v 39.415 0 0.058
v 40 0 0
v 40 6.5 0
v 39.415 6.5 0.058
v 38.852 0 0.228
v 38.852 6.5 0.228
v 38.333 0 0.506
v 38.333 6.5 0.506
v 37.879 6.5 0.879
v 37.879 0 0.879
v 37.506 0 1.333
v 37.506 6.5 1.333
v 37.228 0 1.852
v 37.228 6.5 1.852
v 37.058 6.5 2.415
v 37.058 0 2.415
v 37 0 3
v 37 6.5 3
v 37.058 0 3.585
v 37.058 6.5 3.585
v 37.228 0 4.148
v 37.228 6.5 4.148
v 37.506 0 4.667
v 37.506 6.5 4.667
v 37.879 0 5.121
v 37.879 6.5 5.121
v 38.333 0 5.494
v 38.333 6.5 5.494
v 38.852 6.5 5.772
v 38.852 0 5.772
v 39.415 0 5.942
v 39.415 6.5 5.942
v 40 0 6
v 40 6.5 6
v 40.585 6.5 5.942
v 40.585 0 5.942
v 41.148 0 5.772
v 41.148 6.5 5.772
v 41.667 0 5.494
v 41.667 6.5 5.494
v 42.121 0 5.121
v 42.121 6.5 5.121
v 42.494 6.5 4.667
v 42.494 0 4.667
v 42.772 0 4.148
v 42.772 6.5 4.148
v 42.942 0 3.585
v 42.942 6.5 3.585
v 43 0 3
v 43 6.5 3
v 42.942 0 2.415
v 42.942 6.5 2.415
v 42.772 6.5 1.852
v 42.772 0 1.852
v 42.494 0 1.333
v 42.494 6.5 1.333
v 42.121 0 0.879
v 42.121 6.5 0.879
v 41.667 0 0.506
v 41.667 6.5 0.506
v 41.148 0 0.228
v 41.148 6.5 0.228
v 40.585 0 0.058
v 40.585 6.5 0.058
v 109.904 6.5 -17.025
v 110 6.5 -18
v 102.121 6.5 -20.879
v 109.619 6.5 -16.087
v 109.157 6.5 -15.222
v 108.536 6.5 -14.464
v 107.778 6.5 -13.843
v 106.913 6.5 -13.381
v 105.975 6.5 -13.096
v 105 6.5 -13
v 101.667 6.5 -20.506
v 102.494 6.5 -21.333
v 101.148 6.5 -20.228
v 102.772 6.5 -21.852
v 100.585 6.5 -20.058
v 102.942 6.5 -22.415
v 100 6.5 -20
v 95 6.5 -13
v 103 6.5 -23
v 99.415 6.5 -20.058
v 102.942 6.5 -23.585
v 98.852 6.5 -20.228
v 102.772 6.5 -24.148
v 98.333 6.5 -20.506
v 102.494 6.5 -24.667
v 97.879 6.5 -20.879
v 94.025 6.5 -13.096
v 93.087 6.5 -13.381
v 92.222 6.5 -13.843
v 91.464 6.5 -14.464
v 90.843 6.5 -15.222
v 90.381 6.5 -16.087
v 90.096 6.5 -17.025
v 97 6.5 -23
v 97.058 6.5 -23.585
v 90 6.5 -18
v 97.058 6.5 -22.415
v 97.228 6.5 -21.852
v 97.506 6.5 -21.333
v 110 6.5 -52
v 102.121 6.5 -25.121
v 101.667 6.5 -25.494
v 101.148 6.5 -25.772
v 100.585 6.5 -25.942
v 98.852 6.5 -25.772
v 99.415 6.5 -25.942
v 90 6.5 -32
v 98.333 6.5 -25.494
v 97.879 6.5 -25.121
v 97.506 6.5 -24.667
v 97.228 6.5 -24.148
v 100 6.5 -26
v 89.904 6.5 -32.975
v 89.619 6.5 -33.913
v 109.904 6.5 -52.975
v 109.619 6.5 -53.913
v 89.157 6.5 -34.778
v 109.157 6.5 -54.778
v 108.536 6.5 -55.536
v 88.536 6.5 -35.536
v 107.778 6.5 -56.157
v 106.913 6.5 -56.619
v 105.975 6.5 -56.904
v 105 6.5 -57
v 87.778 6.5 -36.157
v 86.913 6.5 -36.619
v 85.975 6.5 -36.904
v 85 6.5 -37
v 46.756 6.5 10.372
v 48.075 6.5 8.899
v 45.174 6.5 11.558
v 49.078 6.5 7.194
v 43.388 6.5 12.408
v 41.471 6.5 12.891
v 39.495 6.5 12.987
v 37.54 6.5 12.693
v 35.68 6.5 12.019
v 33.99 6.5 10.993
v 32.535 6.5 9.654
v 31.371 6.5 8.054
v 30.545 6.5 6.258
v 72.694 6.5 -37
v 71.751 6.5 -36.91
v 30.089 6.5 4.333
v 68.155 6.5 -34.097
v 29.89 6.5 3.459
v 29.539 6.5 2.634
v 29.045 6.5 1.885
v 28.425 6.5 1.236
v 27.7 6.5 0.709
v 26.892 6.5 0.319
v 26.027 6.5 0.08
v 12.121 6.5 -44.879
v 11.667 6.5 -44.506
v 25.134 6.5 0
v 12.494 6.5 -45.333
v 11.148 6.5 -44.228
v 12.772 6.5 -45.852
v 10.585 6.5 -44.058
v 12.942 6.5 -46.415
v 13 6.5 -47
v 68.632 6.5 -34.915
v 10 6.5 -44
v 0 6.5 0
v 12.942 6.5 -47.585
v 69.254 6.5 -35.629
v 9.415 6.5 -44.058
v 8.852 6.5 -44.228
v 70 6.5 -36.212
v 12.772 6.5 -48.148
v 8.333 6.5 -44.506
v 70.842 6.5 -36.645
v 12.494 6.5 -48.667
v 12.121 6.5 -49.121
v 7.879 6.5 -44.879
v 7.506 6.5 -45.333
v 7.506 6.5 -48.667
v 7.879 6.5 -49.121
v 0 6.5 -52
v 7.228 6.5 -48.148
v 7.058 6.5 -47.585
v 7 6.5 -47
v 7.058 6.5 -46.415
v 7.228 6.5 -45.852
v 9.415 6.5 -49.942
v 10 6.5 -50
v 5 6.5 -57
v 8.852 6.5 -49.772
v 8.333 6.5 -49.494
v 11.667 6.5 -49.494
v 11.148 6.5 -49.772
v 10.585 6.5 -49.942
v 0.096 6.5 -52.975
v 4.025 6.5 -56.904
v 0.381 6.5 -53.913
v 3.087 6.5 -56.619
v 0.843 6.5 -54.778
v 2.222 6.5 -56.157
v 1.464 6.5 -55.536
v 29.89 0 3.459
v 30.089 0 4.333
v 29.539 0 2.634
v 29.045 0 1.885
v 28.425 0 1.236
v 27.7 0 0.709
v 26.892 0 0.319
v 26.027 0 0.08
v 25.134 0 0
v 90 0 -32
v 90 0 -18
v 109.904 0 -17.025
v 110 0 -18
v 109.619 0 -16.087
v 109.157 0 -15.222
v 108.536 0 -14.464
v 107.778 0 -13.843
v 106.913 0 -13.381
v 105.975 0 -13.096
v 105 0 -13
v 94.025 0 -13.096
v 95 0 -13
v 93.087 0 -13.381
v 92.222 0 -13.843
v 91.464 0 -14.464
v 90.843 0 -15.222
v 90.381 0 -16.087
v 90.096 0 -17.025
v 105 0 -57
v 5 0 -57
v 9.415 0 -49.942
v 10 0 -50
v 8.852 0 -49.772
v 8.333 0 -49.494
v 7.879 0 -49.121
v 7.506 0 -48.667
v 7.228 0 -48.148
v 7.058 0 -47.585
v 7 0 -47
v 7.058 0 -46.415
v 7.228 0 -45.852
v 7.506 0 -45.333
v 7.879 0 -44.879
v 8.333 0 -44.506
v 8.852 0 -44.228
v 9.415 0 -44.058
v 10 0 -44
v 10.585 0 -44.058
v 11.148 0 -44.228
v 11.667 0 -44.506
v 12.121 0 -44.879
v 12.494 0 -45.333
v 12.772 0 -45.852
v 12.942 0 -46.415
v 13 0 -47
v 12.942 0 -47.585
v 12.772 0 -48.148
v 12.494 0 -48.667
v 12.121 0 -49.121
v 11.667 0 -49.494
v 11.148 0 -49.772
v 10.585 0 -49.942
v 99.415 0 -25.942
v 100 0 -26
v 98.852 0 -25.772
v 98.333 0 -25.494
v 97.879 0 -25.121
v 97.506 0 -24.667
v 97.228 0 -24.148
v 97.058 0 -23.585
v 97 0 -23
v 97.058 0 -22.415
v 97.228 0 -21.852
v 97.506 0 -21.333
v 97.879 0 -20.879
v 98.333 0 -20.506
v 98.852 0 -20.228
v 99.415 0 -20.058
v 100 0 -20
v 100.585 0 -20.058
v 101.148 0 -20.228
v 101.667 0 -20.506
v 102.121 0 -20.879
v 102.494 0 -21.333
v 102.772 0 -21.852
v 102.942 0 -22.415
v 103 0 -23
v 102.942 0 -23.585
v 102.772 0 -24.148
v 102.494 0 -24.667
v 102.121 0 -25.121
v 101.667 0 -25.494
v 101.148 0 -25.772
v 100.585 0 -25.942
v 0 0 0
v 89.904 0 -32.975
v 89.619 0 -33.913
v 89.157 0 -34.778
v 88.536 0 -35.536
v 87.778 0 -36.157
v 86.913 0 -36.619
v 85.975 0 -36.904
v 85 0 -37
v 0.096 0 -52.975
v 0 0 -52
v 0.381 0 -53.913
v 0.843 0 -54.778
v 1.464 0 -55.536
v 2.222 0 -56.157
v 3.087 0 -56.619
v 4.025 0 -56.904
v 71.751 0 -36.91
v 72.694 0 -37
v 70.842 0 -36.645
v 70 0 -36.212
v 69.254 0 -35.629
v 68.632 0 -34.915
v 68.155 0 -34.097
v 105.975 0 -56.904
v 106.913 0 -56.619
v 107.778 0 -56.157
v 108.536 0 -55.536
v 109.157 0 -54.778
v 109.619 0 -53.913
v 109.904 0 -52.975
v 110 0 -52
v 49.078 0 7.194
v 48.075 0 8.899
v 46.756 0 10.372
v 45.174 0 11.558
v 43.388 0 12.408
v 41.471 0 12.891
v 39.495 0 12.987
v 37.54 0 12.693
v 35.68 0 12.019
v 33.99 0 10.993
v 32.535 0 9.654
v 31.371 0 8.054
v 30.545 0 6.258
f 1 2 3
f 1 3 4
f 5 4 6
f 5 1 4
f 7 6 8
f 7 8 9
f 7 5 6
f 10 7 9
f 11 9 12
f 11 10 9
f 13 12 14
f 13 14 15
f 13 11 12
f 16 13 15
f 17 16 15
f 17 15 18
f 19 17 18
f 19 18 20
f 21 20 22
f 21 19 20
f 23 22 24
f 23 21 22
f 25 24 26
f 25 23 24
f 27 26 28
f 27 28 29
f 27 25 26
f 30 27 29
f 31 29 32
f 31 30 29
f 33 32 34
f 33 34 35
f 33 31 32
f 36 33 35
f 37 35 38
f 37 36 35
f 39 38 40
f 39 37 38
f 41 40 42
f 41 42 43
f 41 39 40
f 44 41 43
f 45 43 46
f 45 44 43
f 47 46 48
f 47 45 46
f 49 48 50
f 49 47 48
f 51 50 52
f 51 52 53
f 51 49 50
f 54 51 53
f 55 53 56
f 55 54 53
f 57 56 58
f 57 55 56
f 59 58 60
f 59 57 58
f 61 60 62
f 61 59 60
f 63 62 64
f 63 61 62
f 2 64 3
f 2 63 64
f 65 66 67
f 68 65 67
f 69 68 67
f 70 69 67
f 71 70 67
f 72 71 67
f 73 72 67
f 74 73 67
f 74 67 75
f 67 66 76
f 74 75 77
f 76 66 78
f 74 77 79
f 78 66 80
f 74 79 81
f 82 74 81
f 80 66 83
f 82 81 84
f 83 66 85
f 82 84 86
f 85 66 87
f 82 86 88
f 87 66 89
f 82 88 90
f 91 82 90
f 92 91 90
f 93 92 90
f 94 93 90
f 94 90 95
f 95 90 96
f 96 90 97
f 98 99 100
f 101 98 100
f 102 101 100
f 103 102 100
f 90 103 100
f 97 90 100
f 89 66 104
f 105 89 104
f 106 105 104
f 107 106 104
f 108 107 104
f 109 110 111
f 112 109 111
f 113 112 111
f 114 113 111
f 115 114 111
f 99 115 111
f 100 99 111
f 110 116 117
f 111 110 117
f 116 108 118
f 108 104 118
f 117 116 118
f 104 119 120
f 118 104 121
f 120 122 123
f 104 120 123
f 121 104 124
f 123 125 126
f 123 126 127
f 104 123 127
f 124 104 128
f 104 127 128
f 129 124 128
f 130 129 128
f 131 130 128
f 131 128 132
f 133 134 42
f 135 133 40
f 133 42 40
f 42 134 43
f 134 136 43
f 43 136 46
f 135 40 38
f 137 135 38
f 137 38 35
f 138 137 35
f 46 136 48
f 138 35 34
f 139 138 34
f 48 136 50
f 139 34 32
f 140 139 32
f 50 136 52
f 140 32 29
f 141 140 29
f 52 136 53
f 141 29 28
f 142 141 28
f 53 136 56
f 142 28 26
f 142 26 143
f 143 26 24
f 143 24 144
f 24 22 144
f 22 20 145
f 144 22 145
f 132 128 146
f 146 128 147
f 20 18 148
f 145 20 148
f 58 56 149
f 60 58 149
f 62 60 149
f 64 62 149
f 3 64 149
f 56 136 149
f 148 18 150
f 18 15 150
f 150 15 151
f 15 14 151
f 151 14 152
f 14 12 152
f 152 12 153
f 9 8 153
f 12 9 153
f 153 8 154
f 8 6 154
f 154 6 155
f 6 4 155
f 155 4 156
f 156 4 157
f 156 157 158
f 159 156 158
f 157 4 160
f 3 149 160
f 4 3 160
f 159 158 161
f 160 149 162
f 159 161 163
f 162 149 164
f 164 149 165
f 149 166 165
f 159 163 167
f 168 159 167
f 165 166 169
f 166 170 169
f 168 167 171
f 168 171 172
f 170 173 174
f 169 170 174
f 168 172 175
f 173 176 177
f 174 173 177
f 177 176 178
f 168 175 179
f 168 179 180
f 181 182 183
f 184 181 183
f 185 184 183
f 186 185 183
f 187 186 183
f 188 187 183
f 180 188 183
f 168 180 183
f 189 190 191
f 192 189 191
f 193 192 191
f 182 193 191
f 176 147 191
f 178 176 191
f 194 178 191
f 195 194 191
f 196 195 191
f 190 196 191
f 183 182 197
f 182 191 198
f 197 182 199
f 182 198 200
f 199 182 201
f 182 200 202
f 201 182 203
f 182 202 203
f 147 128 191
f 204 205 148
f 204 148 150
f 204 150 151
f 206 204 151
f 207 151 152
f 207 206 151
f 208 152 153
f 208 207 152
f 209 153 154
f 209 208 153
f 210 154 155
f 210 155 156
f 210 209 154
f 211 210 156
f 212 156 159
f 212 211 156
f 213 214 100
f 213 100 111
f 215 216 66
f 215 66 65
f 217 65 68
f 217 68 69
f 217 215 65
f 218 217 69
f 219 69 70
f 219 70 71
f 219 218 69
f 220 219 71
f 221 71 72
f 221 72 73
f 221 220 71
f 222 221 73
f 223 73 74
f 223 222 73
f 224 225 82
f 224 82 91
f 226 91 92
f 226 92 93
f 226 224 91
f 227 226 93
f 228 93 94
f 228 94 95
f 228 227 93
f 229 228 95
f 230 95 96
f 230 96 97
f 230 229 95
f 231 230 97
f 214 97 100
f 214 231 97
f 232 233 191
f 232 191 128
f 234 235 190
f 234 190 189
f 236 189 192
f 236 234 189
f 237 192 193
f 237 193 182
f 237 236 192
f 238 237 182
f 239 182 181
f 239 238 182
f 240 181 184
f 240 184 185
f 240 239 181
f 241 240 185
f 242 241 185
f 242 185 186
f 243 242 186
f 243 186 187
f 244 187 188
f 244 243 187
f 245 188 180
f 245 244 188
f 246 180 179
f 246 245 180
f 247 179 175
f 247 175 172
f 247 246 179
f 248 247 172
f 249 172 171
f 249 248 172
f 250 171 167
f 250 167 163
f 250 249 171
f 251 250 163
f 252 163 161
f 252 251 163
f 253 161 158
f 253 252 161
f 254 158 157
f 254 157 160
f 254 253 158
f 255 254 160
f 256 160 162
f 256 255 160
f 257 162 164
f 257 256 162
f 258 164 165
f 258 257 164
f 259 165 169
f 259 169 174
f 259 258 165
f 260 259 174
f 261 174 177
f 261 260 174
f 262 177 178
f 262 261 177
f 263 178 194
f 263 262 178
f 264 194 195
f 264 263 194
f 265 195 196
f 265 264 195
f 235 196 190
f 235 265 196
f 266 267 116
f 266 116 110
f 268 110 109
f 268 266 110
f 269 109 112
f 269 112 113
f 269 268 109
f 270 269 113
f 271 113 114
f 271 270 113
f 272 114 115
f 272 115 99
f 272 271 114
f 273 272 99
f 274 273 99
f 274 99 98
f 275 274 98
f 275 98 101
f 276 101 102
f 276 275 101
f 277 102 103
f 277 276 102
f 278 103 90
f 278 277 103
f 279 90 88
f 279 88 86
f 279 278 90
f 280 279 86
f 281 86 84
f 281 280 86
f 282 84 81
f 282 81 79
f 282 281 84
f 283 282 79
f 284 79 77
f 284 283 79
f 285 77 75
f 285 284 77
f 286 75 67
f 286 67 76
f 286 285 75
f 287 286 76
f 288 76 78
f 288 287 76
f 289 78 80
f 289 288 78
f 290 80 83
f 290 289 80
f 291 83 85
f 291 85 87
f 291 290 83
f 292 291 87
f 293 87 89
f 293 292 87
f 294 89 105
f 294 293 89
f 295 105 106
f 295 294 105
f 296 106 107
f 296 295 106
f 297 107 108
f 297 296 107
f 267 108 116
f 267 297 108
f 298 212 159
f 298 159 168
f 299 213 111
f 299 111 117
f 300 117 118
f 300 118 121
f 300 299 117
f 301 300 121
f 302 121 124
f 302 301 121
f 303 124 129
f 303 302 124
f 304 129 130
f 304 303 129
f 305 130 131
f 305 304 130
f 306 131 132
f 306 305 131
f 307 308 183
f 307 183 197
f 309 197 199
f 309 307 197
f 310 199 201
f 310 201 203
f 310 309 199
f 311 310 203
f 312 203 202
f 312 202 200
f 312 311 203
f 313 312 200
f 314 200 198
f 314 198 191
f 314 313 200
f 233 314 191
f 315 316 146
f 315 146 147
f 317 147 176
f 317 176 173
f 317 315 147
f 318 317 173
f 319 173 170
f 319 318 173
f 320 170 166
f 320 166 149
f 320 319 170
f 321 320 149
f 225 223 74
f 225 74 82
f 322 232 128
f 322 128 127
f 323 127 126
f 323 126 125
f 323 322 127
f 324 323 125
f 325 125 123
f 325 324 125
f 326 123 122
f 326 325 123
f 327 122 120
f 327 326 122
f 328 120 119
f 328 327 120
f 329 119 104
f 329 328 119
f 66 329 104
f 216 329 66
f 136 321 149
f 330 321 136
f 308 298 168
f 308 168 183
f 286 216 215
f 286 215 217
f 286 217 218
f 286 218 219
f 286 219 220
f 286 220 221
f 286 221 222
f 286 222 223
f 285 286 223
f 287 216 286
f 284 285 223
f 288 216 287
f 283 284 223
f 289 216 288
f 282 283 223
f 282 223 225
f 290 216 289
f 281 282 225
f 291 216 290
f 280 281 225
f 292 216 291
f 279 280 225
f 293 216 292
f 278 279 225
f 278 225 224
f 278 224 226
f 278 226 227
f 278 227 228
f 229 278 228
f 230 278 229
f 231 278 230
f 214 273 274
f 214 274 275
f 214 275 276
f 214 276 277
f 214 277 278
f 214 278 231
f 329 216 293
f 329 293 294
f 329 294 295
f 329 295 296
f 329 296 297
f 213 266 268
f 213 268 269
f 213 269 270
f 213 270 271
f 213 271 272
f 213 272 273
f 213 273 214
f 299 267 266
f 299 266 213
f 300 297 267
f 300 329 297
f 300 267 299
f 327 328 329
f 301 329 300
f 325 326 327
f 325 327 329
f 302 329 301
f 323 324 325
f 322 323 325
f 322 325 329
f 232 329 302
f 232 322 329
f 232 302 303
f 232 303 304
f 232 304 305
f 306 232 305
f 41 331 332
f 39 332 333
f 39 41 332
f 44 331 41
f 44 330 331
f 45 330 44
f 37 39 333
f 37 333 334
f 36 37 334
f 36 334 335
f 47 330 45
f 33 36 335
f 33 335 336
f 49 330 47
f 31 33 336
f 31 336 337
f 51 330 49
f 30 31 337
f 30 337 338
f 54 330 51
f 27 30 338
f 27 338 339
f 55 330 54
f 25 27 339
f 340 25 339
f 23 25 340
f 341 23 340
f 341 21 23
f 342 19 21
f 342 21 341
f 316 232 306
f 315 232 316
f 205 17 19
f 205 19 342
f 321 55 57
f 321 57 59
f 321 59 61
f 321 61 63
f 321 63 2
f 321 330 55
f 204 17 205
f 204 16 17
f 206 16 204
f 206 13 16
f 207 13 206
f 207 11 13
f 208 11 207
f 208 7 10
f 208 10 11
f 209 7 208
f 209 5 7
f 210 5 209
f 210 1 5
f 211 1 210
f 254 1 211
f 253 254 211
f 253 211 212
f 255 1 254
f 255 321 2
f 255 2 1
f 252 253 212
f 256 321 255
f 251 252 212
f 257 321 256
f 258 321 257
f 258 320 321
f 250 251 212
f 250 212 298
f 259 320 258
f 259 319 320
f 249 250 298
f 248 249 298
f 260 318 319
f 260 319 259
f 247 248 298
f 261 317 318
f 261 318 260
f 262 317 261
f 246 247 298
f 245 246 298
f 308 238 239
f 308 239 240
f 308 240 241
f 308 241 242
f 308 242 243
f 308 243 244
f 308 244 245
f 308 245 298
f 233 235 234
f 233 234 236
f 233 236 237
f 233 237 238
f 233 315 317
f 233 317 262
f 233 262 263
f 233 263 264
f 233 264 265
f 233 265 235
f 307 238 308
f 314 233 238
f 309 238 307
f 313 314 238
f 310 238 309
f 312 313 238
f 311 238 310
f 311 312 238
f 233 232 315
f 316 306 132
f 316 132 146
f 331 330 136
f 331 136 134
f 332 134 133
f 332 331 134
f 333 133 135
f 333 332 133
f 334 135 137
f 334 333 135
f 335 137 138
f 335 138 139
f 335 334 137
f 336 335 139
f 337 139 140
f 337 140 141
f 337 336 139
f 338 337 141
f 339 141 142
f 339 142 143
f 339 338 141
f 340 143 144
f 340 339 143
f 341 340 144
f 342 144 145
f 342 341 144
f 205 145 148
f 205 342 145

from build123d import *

# Parameters (mm, degrees)
SKETCH_1_R      = 3
EXTRUDE_1_DEPTH = 6.5


with BuildPart() as part:
    # 스케치1 → 보스-돌출1 (new body)
    with BuildSketch(Plane(origin=(0, 0, 0), x_dir=(1, 0, 0), z_dir=(0, 1, 0))):
        with BuildLine():
            Line((0, 0), (0, 52))
            ThreePointArc((0, 52), (1.464466094, 55.535533906), (5, 57))
            Line((5, 57), (105, 57))
            ThreePointArc((105, 57), (108.535533906, 55.535533906), (110, 52))
            Line((110, 52), (110, 18))
            ThreePointArc((110, 18), (108.535533906, 14.464466094), (105, 13))
            Line((105, 13), (95, 13))
            ThreePointArc((95, 13), (91.464466094, 14.464466094), (90, 18))
            Line((90, 18), (90, 32))
            ThreePointArc((90, 32), (88.535533906, 35.535533906), (85, 37))
            Line((85, 37), (72.693946289, 37))
            ThreePointArc((72.693946289, 37), (70, 36.212202915), (68.154966925, 34.097061358))
            Line((68.154966925, 34.097061358), (49.077958727, -7.194122715))
            ThreePointArc((49.077958727, -7.194122715), (38.51023536, -12.888407421), (30.089287502, -4.333333333))
            ThreePointArc((30.089287502, -4.333333333), (28.425334196, -1.236136736), (25.133931253, 0))
            Line((25.133931253, 0), (0, 0))
        make_face()
        with Locations(Location((10, 47, 0), (0, 0, 90))):
            Circle(SKETCH_1_R, mode=Mode.SUBTRACT)
        with Locations(Location((40, -3, 0), (0, 0, 90))):
            Circle(SKETCH_1_R, mode=Mode.SUBTRACT)
        with Locations(Location((100, 23, 0), (0, 0, 90))):
            Circle(SKETCH_1_R, mode=Mode.SUBTRACT)
    extrude(amount=EXTRUDE_1_DEPTH)


solid = part.part
